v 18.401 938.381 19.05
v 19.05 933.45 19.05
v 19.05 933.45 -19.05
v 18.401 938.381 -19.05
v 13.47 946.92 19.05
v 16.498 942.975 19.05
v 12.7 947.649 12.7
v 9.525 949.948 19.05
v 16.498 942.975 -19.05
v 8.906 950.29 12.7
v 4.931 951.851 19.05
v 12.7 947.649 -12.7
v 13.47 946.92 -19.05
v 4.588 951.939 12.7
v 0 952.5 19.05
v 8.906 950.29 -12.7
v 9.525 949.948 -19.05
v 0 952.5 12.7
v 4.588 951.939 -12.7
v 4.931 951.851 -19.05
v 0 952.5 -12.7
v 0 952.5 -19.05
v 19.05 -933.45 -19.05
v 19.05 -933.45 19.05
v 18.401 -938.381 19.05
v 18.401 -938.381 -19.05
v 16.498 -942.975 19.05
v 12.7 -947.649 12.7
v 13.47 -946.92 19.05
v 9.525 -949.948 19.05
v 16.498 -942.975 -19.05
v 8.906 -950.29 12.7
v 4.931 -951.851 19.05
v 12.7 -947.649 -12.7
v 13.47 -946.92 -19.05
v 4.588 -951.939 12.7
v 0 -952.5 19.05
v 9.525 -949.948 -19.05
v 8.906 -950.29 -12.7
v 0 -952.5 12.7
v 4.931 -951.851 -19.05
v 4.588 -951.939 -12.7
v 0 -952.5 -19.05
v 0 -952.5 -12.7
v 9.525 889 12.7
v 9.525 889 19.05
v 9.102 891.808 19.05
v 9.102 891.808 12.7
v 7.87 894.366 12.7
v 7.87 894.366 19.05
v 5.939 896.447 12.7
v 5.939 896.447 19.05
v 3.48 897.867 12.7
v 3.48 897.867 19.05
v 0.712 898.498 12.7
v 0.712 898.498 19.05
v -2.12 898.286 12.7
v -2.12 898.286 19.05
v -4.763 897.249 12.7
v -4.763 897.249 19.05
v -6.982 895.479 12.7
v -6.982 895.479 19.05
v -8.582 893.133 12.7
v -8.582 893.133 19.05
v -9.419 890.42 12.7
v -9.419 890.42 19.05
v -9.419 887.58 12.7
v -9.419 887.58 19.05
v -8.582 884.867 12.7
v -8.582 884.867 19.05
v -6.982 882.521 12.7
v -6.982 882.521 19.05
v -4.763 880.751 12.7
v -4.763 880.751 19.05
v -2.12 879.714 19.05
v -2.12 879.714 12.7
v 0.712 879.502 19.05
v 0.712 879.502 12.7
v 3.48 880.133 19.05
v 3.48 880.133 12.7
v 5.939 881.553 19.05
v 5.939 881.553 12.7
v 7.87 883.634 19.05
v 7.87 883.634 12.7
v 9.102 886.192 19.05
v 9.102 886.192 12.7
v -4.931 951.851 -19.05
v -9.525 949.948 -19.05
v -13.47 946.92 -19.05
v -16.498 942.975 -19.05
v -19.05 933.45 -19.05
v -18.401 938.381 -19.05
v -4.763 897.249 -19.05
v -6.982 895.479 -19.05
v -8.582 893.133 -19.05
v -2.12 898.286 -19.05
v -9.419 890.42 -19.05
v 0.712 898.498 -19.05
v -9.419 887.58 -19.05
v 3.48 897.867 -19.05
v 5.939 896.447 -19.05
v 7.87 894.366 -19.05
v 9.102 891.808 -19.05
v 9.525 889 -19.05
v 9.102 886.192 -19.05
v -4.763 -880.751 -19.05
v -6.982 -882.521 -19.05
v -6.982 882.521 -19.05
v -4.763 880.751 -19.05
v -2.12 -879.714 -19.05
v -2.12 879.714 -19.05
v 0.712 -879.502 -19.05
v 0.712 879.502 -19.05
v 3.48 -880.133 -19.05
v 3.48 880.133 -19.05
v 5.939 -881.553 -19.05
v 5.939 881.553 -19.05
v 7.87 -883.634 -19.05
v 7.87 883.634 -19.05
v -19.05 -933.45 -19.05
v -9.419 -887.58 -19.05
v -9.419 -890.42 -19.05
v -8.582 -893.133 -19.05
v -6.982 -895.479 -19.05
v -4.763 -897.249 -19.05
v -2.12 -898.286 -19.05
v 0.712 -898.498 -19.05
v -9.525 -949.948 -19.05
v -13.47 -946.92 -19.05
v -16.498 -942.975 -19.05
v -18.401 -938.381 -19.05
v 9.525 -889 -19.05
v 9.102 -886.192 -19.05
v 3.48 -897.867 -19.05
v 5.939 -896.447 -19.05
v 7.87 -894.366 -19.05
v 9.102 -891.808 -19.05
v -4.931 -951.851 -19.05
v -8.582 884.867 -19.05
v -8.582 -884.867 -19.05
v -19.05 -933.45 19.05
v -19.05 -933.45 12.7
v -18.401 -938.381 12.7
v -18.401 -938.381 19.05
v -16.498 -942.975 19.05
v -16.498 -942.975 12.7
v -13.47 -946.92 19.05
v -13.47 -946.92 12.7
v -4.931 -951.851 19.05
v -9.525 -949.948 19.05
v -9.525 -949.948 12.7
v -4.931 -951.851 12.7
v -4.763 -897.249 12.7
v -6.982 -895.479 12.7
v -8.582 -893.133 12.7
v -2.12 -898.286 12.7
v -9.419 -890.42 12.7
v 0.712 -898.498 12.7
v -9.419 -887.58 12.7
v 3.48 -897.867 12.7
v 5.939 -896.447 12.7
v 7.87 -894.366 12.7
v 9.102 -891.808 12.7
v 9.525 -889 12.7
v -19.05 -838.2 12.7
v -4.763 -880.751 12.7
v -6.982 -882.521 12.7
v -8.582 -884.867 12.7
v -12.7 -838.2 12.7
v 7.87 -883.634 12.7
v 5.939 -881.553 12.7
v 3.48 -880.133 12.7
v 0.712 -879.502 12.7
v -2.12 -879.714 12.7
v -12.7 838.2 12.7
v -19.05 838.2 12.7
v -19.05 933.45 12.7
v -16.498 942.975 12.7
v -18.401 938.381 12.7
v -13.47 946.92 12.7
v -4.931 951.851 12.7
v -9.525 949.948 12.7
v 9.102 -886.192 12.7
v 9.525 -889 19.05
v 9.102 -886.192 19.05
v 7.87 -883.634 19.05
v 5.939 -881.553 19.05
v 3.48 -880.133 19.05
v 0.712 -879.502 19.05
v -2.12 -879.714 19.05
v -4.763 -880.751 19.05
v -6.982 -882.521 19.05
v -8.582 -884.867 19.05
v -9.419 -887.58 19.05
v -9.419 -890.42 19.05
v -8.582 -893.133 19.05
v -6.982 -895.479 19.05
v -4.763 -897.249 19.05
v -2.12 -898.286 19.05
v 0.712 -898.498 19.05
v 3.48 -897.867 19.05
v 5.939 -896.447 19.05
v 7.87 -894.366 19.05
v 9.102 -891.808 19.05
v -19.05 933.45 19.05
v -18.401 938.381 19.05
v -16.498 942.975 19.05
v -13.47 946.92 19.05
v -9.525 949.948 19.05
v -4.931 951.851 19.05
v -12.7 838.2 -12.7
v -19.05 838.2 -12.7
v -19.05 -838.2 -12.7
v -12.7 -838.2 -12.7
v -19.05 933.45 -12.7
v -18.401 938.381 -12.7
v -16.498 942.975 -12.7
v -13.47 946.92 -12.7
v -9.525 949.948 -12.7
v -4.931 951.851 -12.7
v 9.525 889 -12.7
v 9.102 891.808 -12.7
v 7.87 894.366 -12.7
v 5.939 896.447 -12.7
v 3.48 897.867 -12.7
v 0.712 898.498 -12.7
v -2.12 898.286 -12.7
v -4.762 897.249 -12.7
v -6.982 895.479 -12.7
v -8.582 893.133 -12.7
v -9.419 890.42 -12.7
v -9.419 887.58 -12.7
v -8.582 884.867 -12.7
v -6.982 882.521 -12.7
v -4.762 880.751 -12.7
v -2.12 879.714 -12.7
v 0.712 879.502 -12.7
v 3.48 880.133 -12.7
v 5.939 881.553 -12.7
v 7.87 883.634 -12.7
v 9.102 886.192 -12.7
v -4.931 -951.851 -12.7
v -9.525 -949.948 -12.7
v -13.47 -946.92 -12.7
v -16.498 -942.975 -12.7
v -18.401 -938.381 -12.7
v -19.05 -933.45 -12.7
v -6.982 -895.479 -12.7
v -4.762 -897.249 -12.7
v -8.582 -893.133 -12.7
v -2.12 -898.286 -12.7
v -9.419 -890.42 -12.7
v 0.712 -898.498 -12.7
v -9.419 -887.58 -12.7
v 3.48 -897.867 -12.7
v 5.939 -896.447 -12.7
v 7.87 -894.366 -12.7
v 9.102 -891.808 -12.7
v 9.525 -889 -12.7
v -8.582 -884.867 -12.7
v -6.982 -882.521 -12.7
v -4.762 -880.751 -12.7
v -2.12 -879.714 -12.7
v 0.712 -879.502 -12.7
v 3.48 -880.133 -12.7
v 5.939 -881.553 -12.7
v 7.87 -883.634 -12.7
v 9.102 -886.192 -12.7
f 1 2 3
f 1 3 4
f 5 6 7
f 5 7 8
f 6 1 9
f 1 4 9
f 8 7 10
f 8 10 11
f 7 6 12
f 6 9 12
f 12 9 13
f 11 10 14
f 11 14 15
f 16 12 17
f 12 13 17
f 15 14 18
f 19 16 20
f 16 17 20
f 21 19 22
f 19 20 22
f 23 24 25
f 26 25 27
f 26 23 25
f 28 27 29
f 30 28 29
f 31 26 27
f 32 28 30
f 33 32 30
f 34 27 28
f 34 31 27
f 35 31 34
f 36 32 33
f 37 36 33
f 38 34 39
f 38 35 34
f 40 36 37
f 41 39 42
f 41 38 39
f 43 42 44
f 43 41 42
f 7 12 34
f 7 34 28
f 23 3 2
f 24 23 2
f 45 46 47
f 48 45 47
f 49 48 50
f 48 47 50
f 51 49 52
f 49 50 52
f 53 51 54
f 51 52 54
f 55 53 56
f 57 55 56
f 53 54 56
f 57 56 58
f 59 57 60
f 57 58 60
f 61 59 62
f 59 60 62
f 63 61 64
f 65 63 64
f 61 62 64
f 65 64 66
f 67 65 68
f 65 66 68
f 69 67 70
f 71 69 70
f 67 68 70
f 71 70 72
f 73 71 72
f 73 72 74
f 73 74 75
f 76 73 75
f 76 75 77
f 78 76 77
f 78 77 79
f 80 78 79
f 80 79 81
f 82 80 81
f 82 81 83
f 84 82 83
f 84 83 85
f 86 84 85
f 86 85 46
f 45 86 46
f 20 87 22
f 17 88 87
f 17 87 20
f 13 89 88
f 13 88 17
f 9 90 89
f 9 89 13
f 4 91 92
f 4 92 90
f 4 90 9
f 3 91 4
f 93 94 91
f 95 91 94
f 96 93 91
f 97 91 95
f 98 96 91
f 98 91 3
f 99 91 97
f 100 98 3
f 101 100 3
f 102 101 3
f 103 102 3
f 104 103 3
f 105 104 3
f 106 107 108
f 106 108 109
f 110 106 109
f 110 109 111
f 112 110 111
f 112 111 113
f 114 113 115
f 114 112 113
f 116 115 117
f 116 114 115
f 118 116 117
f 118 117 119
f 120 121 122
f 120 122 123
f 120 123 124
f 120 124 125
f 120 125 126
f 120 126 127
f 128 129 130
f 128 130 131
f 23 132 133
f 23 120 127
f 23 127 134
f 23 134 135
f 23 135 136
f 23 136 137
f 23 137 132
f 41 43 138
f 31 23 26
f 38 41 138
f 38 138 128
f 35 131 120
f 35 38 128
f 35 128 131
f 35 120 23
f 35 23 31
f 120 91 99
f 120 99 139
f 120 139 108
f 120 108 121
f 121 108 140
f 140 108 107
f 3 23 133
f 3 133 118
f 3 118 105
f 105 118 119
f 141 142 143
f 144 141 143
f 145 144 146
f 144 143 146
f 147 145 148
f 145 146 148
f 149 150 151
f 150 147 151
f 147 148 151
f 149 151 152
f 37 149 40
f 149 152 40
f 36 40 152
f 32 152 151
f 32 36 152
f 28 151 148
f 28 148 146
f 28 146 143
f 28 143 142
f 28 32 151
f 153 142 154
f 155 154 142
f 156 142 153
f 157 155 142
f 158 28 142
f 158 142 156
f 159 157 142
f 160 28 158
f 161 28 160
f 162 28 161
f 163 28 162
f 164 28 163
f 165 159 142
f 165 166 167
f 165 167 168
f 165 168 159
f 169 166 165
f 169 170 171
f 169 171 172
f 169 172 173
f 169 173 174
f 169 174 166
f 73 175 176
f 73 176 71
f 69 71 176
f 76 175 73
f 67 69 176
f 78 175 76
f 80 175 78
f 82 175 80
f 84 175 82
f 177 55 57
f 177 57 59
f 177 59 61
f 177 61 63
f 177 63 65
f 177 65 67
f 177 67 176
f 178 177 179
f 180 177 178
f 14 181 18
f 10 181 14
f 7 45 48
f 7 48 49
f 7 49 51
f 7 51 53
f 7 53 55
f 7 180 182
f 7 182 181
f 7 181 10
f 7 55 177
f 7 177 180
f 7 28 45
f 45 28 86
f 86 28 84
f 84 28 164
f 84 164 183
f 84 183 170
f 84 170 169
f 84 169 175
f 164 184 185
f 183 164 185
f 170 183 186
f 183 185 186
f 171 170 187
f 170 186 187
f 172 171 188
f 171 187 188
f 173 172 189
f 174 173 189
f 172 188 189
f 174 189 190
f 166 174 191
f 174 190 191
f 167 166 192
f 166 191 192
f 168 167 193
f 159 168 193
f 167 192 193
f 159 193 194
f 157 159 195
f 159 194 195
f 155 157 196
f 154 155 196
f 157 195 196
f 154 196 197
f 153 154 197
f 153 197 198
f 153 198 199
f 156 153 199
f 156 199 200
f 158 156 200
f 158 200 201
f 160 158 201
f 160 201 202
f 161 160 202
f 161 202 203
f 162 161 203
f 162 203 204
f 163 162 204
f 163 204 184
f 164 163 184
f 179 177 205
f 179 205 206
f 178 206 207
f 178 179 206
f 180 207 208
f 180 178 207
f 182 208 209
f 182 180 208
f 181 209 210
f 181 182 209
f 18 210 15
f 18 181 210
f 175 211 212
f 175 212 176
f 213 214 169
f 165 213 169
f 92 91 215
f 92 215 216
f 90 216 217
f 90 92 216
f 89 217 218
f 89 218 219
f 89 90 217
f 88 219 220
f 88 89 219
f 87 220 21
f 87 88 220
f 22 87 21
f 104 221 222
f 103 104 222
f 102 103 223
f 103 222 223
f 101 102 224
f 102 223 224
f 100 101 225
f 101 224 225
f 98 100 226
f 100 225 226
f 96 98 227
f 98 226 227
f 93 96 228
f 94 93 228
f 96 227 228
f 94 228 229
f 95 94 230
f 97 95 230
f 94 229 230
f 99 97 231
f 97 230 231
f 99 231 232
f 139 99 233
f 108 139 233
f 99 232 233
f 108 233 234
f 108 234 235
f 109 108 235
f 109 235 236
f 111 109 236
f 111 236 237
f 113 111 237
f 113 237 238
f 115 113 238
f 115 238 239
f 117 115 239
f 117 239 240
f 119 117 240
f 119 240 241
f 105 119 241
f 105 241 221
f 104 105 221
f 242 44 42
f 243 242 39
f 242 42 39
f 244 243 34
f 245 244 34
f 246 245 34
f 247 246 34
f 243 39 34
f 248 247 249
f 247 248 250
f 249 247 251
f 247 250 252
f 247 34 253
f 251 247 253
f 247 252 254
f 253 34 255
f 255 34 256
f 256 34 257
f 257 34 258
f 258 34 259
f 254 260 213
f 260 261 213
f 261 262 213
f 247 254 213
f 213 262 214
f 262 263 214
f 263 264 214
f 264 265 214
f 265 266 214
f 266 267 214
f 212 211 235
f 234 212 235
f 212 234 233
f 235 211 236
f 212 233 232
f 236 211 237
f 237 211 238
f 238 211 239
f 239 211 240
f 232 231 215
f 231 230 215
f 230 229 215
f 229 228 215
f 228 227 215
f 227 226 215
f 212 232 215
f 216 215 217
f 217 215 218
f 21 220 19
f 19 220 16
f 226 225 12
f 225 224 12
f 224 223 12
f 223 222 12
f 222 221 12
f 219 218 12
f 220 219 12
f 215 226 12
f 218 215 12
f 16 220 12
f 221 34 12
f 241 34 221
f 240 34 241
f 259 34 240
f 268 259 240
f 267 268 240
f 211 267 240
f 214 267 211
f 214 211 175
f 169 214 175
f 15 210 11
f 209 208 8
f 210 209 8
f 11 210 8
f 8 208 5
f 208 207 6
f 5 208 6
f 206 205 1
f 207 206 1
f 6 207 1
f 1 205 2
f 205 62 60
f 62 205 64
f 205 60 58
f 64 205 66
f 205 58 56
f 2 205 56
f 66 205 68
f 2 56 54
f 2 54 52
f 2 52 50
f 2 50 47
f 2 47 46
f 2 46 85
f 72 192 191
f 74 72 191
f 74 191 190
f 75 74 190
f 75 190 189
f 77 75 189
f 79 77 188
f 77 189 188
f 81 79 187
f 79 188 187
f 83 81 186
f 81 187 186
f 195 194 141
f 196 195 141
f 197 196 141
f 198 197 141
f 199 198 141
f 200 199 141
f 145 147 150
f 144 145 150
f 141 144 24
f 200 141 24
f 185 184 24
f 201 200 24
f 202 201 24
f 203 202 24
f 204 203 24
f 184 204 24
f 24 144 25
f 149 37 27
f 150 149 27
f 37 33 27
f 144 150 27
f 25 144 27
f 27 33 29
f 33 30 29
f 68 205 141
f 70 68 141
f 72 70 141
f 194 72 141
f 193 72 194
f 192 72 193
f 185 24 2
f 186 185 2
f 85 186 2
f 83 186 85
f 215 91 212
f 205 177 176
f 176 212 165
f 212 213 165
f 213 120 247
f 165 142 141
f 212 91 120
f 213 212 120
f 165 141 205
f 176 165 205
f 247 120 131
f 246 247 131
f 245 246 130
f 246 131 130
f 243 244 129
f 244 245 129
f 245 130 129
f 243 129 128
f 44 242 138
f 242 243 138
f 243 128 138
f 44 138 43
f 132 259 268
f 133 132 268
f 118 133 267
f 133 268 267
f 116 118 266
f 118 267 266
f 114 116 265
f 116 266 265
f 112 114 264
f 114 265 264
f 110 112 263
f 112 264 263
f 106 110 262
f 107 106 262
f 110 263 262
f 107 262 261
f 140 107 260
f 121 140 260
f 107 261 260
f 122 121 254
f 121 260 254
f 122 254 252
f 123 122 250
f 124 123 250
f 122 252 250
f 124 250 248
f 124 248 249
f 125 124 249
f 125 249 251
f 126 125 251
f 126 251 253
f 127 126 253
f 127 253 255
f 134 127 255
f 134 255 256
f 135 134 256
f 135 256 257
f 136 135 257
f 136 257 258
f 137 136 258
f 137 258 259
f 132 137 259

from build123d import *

# Parameters (mm, degrees)
F0_W        = 38.1
F0_H        = 38.1
F0_W_2      = 25.4
F0_H_2      = 25.4
F1_DEPTH    = 952.5
F2_R        = 9.525
F3_DEPTH    = 76.2
F4_W        = 127
F4_H        = 25.4
F5_DEPTH    = 25.4
F6_T1_DEPTH = 133.35
F6_T3_DEPTH = 101.6
F6_T5_DEPTH = 101.6


# Not quite as in the source:
# - a fillet or chamfer that OpenCascade refuses, or shapes differently, is made with other operations: its cross-section is extruded or revolved along the edge and cut away or added


with BuildPart() as f1:
    # F0 (on Front) → F1 (new body, symmetric)
    with BuildSketch(Plane.XZ):
        Rectangle(F0_W, F0_H)
        Rectangle(F0_W_2, F0_H_2, mode=Mode.SUBTRACT)
    extrude(amount=F1_DEPTH, both=True)

    # F2 (on face) → F3 (cut)
    with BuildSketch(Plane.XY.offset(19.05)):
        with Locations((0, -889)):
            Circle(F2_R)
        with Locations((0, 889)):
            Circle(F2_R)
    extrude(amount=-F3_DEPTH, mode=Mode.SUBTRACT)

    # F4 (on Right) → F5 (cut)
    with BuildSketch(Plane.YZ):
        with Locations((901.7, 0)):
            Rectangle(F4_W, F4_H)
        with Locations((-901.7, 0)):
            Rectangle(F4_W, F4_H)
    extrude(amount=-F5_DEPTH, mode=Mode.SUBTRACT)

    # F6: fillet of radius 19.05 on 6 edges, made by hand

    # F6_s2 → F6_t1 (cut)
    with BuildSketch(Plane.XY.offset(-66.675)):
        with BuildLine():
            ThreePointArc((19.05, -933.45), (13.4703841816, -946.9203841816), (0, -952.5))
            Line((0, -952.5), (19.05, -952.5))
            Line((19.05, -952.5), (19.05, -933.45))
        make_face()
        with BuildLine():
            ThreePointArc((19.05, 933.45), (13.4703841816, 946.9203841816), (0, 952.5))
            Line((0, 952.5), (19.05, 952.5))
            Line((19.05, 952.5), (19.05, 933.45))
        make_face()
    extrude(amount=F6_T1_DEPTH, mode=Mode.SUBTRACT)

    # F6_s4 → F6_t3 (cut)
    with BuildSketch(Plane.XY.offset(-34.925)):
        with BuildLine():
            ThreePointArc((-19.05, -933.45), (-13.4703841816, -946.9203841816), (0, -952.5))
            Line((0, -952.5), (-19.05, -952.5))
            Line((-19.05, -952.5), (-19.05, -933.45))
        make_face()
        with BuildLine():
            ThreePointArc((-19.05, 933.45), (-13.4703841816, 946.9203841816), (0, 952.5))
            Line((0, 952.5), (-19.05, 952.5))
            Line((-19.05, 952.5), (-19.05, 933.45))
        make_face()
    extrude(amount=F6_T3_DEPTH, mode=Mode.SUBTRACT)

    # F6_s6 → F6_t5 (cut)
    with BuildSketch(Plane.XY.offset(-66.675)):
        with BuildLine():
            ThreePointArc((-19.05, -933.45), (-13.4703841816, -946.9203841816), (0, -952.5))
            Line((0, -952.5), (-19.05, -952.5))
            Line((-19.05, -952.5), (-19.05, -933.45))
        make_face()
        with BuildLine():
            ThreePointArc((-19.05, 933.45), (-13.4703841816, 946.9203841816), (0, 952.5))
            Line((0, 952.5), (-19.05, 952.5))
            Line((-19.05, 952.5), (-19.05, 933.45))
        make_face()
    extrude(amount=F6_T5_DEPTH, mode=Mode.SUBTRACT)


solid = f1.part
